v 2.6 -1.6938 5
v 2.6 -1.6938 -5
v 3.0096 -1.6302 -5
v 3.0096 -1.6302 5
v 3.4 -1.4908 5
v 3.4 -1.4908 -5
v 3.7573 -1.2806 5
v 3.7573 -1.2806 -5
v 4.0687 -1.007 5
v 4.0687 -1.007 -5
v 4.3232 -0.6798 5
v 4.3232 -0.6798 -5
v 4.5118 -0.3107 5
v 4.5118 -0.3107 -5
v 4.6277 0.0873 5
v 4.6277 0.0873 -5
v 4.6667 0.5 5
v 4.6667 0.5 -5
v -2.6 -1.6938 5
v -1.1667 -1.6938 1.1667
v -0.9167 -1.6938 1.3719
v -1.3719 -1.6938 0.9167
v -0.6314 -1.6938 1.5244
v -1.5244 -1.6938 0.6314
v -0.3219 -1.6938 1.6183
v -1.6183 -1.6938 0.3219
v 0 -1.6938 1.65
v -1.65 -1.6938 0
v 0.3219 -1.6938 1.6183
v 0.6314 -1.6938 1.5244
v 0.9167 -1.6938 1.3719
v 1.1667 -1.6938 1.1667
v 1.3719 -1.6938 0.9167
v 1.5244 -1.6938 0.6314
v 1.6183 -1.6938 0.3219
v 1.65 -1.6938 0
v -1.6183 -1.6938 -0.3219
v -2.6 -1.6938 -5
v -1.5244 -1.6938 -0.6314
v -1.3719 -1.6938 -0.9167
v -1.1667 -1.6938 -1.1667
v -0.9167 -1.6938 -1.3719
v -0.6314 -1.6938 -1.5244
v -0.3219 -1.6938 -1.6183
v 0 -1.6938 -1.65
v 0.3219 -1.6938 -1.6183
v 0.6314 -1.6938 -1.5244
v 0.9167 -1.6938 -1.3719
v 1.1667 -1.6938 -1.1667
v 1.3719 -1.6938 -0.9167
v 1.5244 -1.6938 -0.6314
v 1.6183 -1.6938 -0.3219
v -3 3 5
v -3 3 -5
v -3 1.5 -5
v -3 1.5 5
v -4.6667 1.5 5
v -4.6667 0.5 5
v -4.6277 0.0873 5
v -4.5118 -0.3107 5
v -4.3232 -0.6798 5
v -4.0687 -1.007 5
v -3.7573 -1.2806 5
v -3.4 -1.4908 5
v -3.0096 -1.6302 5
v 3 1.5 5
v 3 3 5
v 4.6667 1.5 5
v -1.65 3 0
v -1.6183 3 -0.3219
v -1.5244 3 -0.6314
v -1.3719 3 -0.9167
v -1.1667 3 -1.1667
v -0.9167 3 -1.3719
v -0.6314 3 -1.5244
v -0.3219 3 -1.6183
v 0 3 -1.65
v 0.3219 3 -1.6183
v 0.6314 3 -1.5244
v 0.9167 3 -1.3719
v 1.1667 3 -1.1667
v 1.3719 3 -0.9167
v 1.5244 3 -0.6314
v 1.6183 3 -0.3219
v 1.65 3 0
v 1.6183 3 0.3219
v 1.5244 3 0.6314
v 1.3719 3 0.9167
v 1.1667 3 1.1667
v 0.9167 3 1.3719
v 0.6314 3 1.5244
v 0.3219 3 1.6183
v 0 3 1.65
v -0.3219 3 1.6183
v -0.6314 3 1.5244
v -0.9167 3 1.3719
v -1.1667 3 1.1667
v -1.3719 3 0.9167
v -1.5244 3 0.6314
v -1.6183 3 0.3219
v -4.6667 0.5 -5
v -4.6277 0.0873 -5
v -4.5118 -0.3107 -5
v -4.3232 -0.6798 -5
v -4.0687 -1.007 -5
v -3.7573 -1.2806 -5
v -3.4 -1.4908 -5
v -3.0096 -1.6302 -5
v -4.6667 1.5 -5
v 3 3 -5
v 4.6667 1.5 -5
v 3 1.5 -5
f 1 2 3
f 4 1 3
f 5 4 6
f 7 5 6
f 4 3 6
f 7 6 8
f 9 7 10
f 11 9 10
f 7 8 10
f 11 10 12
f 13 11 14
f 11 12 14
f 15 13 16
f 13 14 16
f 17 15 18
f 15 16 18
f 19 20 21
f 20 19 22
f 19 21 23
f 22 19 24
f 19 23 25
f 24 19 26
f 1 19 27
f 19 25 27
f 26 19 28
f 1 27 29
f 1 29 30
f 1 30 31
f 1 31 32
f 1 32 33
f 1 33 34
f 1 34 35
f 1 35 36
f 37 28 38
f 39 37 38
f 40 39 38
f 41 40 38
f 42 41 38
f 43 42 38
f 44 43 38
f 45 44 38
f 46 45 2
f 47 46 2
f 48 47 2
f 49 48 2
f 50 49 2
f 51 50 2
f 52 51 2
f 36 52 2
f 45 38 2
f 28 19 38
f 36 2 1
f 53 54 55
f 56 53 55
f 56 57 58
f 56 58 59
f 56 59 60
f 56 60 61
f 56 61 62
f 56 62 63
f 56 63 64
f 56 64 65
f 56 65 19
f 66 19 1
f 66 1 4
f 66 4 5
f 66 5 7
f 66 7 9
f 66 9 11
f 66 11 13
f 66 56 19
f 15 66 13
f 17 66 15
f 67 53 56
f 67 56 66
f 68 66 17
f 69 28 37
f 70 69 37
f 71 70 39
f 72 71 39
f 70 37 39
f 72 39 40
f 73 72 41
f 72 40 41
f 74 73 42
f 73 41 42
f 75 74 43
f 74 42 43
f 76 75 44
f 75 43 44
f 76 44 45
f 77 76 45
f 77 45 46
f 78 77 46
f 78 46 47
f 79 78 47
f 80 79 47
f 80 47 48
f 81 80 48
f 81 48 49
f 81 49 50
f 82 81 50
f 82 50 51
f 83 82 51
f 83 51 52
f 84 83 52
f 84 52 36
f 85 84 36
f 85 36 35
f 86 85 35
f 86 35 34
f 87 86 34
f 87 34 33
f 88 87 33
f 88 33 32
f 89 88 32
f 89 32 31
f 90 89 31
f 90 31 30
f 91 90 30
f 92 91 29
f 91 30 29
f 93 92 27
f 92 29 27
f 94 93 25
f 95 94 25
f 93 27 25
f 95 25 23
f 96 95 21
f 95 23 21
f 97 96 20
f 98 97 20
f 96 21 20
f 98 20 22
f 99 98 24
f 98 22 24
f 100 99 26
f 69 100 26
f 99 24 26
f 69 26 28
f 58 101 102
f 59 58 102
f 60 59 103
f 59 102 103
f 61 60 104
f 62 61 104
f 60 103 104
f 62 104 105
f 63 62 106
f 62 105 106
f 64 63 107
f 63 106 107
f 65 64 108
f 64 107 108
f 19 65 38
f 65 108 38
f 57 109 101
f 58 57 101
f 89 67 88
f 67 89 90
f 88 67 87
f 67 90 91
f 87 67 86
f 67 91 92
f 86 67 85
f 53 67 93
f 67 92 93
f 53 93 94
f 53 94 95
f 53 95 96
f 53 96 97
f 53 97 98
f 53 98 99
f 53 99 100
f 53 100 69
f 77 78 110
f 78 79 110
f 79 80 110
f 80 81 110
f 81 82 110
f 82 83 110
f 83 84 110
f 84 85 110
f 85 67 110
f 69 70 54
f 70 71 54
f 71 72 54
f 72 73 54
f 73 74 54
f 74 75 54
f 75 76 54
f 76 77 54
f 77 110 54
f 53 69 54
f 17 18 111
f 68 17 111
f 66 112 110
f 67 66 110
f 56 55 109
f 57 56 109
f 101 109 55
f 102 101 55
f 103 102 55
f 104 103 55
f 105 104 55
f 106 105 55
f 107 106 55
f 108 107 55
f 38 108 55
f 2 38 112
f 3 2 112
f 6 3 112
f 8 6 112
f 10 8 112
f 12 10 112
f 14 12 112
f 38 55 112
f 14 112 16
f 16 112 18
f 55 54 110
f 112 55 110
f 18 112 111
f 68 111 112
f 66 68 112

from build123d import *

# Parameters (mm, degrees)
EXTRUDE_1_DEPTH    = 10
HOLE_WIZARD_M4_1_D = 3.3


with BuildPart() as part:
    # 草图1 → 凸台-拉伸1 (new body)
    with BuildSketch(Plane.XY):
        with BuildLine():
            Line((3, 3), (-3, 3))
            Line((-3, 3), (-3, 1.5))
            Line((-3, 1.5), (-4.666746731, 1.5))
            Line((-4.666746731, 1.5), (-4.666746731, 0.5))
            ThreePointArc((-4.666746731, 0.5), (-4.068683171, -1.006990331), (-2.6, -1.69377241))
            Line((-2.6, -1.69377241), (2.6, -1.69377241))
            ThreePointArc((2.6, -1.69377241), (4.068683171, -1.006990331), (4.666746731, 0.5))
            Line((4.666746731, 0.5), (4.666746731, 1.5))
            Line((4.666746731, 1.5), (3, 1.5))
            Line((3, 1.5), (3, 3))
        make_face()
    extrude(amount=EXTRUDE_1_DEPTH)

    # M4 螺纹孔1 (through all)
    with Locations(Plane(origin=(0, 3, 0), x_dir=(1, 0, 0), z_dir=(0, 1, 0))):
        with Locations((0, -5)):
            Hole(HOLE_WIZARD_M4_1_D / 2)


with BuildPart() as part_1:
    # Move Body 1: moved
    add(part.part.moved(Location((0, 0, -5))))


solid = part_1.part
